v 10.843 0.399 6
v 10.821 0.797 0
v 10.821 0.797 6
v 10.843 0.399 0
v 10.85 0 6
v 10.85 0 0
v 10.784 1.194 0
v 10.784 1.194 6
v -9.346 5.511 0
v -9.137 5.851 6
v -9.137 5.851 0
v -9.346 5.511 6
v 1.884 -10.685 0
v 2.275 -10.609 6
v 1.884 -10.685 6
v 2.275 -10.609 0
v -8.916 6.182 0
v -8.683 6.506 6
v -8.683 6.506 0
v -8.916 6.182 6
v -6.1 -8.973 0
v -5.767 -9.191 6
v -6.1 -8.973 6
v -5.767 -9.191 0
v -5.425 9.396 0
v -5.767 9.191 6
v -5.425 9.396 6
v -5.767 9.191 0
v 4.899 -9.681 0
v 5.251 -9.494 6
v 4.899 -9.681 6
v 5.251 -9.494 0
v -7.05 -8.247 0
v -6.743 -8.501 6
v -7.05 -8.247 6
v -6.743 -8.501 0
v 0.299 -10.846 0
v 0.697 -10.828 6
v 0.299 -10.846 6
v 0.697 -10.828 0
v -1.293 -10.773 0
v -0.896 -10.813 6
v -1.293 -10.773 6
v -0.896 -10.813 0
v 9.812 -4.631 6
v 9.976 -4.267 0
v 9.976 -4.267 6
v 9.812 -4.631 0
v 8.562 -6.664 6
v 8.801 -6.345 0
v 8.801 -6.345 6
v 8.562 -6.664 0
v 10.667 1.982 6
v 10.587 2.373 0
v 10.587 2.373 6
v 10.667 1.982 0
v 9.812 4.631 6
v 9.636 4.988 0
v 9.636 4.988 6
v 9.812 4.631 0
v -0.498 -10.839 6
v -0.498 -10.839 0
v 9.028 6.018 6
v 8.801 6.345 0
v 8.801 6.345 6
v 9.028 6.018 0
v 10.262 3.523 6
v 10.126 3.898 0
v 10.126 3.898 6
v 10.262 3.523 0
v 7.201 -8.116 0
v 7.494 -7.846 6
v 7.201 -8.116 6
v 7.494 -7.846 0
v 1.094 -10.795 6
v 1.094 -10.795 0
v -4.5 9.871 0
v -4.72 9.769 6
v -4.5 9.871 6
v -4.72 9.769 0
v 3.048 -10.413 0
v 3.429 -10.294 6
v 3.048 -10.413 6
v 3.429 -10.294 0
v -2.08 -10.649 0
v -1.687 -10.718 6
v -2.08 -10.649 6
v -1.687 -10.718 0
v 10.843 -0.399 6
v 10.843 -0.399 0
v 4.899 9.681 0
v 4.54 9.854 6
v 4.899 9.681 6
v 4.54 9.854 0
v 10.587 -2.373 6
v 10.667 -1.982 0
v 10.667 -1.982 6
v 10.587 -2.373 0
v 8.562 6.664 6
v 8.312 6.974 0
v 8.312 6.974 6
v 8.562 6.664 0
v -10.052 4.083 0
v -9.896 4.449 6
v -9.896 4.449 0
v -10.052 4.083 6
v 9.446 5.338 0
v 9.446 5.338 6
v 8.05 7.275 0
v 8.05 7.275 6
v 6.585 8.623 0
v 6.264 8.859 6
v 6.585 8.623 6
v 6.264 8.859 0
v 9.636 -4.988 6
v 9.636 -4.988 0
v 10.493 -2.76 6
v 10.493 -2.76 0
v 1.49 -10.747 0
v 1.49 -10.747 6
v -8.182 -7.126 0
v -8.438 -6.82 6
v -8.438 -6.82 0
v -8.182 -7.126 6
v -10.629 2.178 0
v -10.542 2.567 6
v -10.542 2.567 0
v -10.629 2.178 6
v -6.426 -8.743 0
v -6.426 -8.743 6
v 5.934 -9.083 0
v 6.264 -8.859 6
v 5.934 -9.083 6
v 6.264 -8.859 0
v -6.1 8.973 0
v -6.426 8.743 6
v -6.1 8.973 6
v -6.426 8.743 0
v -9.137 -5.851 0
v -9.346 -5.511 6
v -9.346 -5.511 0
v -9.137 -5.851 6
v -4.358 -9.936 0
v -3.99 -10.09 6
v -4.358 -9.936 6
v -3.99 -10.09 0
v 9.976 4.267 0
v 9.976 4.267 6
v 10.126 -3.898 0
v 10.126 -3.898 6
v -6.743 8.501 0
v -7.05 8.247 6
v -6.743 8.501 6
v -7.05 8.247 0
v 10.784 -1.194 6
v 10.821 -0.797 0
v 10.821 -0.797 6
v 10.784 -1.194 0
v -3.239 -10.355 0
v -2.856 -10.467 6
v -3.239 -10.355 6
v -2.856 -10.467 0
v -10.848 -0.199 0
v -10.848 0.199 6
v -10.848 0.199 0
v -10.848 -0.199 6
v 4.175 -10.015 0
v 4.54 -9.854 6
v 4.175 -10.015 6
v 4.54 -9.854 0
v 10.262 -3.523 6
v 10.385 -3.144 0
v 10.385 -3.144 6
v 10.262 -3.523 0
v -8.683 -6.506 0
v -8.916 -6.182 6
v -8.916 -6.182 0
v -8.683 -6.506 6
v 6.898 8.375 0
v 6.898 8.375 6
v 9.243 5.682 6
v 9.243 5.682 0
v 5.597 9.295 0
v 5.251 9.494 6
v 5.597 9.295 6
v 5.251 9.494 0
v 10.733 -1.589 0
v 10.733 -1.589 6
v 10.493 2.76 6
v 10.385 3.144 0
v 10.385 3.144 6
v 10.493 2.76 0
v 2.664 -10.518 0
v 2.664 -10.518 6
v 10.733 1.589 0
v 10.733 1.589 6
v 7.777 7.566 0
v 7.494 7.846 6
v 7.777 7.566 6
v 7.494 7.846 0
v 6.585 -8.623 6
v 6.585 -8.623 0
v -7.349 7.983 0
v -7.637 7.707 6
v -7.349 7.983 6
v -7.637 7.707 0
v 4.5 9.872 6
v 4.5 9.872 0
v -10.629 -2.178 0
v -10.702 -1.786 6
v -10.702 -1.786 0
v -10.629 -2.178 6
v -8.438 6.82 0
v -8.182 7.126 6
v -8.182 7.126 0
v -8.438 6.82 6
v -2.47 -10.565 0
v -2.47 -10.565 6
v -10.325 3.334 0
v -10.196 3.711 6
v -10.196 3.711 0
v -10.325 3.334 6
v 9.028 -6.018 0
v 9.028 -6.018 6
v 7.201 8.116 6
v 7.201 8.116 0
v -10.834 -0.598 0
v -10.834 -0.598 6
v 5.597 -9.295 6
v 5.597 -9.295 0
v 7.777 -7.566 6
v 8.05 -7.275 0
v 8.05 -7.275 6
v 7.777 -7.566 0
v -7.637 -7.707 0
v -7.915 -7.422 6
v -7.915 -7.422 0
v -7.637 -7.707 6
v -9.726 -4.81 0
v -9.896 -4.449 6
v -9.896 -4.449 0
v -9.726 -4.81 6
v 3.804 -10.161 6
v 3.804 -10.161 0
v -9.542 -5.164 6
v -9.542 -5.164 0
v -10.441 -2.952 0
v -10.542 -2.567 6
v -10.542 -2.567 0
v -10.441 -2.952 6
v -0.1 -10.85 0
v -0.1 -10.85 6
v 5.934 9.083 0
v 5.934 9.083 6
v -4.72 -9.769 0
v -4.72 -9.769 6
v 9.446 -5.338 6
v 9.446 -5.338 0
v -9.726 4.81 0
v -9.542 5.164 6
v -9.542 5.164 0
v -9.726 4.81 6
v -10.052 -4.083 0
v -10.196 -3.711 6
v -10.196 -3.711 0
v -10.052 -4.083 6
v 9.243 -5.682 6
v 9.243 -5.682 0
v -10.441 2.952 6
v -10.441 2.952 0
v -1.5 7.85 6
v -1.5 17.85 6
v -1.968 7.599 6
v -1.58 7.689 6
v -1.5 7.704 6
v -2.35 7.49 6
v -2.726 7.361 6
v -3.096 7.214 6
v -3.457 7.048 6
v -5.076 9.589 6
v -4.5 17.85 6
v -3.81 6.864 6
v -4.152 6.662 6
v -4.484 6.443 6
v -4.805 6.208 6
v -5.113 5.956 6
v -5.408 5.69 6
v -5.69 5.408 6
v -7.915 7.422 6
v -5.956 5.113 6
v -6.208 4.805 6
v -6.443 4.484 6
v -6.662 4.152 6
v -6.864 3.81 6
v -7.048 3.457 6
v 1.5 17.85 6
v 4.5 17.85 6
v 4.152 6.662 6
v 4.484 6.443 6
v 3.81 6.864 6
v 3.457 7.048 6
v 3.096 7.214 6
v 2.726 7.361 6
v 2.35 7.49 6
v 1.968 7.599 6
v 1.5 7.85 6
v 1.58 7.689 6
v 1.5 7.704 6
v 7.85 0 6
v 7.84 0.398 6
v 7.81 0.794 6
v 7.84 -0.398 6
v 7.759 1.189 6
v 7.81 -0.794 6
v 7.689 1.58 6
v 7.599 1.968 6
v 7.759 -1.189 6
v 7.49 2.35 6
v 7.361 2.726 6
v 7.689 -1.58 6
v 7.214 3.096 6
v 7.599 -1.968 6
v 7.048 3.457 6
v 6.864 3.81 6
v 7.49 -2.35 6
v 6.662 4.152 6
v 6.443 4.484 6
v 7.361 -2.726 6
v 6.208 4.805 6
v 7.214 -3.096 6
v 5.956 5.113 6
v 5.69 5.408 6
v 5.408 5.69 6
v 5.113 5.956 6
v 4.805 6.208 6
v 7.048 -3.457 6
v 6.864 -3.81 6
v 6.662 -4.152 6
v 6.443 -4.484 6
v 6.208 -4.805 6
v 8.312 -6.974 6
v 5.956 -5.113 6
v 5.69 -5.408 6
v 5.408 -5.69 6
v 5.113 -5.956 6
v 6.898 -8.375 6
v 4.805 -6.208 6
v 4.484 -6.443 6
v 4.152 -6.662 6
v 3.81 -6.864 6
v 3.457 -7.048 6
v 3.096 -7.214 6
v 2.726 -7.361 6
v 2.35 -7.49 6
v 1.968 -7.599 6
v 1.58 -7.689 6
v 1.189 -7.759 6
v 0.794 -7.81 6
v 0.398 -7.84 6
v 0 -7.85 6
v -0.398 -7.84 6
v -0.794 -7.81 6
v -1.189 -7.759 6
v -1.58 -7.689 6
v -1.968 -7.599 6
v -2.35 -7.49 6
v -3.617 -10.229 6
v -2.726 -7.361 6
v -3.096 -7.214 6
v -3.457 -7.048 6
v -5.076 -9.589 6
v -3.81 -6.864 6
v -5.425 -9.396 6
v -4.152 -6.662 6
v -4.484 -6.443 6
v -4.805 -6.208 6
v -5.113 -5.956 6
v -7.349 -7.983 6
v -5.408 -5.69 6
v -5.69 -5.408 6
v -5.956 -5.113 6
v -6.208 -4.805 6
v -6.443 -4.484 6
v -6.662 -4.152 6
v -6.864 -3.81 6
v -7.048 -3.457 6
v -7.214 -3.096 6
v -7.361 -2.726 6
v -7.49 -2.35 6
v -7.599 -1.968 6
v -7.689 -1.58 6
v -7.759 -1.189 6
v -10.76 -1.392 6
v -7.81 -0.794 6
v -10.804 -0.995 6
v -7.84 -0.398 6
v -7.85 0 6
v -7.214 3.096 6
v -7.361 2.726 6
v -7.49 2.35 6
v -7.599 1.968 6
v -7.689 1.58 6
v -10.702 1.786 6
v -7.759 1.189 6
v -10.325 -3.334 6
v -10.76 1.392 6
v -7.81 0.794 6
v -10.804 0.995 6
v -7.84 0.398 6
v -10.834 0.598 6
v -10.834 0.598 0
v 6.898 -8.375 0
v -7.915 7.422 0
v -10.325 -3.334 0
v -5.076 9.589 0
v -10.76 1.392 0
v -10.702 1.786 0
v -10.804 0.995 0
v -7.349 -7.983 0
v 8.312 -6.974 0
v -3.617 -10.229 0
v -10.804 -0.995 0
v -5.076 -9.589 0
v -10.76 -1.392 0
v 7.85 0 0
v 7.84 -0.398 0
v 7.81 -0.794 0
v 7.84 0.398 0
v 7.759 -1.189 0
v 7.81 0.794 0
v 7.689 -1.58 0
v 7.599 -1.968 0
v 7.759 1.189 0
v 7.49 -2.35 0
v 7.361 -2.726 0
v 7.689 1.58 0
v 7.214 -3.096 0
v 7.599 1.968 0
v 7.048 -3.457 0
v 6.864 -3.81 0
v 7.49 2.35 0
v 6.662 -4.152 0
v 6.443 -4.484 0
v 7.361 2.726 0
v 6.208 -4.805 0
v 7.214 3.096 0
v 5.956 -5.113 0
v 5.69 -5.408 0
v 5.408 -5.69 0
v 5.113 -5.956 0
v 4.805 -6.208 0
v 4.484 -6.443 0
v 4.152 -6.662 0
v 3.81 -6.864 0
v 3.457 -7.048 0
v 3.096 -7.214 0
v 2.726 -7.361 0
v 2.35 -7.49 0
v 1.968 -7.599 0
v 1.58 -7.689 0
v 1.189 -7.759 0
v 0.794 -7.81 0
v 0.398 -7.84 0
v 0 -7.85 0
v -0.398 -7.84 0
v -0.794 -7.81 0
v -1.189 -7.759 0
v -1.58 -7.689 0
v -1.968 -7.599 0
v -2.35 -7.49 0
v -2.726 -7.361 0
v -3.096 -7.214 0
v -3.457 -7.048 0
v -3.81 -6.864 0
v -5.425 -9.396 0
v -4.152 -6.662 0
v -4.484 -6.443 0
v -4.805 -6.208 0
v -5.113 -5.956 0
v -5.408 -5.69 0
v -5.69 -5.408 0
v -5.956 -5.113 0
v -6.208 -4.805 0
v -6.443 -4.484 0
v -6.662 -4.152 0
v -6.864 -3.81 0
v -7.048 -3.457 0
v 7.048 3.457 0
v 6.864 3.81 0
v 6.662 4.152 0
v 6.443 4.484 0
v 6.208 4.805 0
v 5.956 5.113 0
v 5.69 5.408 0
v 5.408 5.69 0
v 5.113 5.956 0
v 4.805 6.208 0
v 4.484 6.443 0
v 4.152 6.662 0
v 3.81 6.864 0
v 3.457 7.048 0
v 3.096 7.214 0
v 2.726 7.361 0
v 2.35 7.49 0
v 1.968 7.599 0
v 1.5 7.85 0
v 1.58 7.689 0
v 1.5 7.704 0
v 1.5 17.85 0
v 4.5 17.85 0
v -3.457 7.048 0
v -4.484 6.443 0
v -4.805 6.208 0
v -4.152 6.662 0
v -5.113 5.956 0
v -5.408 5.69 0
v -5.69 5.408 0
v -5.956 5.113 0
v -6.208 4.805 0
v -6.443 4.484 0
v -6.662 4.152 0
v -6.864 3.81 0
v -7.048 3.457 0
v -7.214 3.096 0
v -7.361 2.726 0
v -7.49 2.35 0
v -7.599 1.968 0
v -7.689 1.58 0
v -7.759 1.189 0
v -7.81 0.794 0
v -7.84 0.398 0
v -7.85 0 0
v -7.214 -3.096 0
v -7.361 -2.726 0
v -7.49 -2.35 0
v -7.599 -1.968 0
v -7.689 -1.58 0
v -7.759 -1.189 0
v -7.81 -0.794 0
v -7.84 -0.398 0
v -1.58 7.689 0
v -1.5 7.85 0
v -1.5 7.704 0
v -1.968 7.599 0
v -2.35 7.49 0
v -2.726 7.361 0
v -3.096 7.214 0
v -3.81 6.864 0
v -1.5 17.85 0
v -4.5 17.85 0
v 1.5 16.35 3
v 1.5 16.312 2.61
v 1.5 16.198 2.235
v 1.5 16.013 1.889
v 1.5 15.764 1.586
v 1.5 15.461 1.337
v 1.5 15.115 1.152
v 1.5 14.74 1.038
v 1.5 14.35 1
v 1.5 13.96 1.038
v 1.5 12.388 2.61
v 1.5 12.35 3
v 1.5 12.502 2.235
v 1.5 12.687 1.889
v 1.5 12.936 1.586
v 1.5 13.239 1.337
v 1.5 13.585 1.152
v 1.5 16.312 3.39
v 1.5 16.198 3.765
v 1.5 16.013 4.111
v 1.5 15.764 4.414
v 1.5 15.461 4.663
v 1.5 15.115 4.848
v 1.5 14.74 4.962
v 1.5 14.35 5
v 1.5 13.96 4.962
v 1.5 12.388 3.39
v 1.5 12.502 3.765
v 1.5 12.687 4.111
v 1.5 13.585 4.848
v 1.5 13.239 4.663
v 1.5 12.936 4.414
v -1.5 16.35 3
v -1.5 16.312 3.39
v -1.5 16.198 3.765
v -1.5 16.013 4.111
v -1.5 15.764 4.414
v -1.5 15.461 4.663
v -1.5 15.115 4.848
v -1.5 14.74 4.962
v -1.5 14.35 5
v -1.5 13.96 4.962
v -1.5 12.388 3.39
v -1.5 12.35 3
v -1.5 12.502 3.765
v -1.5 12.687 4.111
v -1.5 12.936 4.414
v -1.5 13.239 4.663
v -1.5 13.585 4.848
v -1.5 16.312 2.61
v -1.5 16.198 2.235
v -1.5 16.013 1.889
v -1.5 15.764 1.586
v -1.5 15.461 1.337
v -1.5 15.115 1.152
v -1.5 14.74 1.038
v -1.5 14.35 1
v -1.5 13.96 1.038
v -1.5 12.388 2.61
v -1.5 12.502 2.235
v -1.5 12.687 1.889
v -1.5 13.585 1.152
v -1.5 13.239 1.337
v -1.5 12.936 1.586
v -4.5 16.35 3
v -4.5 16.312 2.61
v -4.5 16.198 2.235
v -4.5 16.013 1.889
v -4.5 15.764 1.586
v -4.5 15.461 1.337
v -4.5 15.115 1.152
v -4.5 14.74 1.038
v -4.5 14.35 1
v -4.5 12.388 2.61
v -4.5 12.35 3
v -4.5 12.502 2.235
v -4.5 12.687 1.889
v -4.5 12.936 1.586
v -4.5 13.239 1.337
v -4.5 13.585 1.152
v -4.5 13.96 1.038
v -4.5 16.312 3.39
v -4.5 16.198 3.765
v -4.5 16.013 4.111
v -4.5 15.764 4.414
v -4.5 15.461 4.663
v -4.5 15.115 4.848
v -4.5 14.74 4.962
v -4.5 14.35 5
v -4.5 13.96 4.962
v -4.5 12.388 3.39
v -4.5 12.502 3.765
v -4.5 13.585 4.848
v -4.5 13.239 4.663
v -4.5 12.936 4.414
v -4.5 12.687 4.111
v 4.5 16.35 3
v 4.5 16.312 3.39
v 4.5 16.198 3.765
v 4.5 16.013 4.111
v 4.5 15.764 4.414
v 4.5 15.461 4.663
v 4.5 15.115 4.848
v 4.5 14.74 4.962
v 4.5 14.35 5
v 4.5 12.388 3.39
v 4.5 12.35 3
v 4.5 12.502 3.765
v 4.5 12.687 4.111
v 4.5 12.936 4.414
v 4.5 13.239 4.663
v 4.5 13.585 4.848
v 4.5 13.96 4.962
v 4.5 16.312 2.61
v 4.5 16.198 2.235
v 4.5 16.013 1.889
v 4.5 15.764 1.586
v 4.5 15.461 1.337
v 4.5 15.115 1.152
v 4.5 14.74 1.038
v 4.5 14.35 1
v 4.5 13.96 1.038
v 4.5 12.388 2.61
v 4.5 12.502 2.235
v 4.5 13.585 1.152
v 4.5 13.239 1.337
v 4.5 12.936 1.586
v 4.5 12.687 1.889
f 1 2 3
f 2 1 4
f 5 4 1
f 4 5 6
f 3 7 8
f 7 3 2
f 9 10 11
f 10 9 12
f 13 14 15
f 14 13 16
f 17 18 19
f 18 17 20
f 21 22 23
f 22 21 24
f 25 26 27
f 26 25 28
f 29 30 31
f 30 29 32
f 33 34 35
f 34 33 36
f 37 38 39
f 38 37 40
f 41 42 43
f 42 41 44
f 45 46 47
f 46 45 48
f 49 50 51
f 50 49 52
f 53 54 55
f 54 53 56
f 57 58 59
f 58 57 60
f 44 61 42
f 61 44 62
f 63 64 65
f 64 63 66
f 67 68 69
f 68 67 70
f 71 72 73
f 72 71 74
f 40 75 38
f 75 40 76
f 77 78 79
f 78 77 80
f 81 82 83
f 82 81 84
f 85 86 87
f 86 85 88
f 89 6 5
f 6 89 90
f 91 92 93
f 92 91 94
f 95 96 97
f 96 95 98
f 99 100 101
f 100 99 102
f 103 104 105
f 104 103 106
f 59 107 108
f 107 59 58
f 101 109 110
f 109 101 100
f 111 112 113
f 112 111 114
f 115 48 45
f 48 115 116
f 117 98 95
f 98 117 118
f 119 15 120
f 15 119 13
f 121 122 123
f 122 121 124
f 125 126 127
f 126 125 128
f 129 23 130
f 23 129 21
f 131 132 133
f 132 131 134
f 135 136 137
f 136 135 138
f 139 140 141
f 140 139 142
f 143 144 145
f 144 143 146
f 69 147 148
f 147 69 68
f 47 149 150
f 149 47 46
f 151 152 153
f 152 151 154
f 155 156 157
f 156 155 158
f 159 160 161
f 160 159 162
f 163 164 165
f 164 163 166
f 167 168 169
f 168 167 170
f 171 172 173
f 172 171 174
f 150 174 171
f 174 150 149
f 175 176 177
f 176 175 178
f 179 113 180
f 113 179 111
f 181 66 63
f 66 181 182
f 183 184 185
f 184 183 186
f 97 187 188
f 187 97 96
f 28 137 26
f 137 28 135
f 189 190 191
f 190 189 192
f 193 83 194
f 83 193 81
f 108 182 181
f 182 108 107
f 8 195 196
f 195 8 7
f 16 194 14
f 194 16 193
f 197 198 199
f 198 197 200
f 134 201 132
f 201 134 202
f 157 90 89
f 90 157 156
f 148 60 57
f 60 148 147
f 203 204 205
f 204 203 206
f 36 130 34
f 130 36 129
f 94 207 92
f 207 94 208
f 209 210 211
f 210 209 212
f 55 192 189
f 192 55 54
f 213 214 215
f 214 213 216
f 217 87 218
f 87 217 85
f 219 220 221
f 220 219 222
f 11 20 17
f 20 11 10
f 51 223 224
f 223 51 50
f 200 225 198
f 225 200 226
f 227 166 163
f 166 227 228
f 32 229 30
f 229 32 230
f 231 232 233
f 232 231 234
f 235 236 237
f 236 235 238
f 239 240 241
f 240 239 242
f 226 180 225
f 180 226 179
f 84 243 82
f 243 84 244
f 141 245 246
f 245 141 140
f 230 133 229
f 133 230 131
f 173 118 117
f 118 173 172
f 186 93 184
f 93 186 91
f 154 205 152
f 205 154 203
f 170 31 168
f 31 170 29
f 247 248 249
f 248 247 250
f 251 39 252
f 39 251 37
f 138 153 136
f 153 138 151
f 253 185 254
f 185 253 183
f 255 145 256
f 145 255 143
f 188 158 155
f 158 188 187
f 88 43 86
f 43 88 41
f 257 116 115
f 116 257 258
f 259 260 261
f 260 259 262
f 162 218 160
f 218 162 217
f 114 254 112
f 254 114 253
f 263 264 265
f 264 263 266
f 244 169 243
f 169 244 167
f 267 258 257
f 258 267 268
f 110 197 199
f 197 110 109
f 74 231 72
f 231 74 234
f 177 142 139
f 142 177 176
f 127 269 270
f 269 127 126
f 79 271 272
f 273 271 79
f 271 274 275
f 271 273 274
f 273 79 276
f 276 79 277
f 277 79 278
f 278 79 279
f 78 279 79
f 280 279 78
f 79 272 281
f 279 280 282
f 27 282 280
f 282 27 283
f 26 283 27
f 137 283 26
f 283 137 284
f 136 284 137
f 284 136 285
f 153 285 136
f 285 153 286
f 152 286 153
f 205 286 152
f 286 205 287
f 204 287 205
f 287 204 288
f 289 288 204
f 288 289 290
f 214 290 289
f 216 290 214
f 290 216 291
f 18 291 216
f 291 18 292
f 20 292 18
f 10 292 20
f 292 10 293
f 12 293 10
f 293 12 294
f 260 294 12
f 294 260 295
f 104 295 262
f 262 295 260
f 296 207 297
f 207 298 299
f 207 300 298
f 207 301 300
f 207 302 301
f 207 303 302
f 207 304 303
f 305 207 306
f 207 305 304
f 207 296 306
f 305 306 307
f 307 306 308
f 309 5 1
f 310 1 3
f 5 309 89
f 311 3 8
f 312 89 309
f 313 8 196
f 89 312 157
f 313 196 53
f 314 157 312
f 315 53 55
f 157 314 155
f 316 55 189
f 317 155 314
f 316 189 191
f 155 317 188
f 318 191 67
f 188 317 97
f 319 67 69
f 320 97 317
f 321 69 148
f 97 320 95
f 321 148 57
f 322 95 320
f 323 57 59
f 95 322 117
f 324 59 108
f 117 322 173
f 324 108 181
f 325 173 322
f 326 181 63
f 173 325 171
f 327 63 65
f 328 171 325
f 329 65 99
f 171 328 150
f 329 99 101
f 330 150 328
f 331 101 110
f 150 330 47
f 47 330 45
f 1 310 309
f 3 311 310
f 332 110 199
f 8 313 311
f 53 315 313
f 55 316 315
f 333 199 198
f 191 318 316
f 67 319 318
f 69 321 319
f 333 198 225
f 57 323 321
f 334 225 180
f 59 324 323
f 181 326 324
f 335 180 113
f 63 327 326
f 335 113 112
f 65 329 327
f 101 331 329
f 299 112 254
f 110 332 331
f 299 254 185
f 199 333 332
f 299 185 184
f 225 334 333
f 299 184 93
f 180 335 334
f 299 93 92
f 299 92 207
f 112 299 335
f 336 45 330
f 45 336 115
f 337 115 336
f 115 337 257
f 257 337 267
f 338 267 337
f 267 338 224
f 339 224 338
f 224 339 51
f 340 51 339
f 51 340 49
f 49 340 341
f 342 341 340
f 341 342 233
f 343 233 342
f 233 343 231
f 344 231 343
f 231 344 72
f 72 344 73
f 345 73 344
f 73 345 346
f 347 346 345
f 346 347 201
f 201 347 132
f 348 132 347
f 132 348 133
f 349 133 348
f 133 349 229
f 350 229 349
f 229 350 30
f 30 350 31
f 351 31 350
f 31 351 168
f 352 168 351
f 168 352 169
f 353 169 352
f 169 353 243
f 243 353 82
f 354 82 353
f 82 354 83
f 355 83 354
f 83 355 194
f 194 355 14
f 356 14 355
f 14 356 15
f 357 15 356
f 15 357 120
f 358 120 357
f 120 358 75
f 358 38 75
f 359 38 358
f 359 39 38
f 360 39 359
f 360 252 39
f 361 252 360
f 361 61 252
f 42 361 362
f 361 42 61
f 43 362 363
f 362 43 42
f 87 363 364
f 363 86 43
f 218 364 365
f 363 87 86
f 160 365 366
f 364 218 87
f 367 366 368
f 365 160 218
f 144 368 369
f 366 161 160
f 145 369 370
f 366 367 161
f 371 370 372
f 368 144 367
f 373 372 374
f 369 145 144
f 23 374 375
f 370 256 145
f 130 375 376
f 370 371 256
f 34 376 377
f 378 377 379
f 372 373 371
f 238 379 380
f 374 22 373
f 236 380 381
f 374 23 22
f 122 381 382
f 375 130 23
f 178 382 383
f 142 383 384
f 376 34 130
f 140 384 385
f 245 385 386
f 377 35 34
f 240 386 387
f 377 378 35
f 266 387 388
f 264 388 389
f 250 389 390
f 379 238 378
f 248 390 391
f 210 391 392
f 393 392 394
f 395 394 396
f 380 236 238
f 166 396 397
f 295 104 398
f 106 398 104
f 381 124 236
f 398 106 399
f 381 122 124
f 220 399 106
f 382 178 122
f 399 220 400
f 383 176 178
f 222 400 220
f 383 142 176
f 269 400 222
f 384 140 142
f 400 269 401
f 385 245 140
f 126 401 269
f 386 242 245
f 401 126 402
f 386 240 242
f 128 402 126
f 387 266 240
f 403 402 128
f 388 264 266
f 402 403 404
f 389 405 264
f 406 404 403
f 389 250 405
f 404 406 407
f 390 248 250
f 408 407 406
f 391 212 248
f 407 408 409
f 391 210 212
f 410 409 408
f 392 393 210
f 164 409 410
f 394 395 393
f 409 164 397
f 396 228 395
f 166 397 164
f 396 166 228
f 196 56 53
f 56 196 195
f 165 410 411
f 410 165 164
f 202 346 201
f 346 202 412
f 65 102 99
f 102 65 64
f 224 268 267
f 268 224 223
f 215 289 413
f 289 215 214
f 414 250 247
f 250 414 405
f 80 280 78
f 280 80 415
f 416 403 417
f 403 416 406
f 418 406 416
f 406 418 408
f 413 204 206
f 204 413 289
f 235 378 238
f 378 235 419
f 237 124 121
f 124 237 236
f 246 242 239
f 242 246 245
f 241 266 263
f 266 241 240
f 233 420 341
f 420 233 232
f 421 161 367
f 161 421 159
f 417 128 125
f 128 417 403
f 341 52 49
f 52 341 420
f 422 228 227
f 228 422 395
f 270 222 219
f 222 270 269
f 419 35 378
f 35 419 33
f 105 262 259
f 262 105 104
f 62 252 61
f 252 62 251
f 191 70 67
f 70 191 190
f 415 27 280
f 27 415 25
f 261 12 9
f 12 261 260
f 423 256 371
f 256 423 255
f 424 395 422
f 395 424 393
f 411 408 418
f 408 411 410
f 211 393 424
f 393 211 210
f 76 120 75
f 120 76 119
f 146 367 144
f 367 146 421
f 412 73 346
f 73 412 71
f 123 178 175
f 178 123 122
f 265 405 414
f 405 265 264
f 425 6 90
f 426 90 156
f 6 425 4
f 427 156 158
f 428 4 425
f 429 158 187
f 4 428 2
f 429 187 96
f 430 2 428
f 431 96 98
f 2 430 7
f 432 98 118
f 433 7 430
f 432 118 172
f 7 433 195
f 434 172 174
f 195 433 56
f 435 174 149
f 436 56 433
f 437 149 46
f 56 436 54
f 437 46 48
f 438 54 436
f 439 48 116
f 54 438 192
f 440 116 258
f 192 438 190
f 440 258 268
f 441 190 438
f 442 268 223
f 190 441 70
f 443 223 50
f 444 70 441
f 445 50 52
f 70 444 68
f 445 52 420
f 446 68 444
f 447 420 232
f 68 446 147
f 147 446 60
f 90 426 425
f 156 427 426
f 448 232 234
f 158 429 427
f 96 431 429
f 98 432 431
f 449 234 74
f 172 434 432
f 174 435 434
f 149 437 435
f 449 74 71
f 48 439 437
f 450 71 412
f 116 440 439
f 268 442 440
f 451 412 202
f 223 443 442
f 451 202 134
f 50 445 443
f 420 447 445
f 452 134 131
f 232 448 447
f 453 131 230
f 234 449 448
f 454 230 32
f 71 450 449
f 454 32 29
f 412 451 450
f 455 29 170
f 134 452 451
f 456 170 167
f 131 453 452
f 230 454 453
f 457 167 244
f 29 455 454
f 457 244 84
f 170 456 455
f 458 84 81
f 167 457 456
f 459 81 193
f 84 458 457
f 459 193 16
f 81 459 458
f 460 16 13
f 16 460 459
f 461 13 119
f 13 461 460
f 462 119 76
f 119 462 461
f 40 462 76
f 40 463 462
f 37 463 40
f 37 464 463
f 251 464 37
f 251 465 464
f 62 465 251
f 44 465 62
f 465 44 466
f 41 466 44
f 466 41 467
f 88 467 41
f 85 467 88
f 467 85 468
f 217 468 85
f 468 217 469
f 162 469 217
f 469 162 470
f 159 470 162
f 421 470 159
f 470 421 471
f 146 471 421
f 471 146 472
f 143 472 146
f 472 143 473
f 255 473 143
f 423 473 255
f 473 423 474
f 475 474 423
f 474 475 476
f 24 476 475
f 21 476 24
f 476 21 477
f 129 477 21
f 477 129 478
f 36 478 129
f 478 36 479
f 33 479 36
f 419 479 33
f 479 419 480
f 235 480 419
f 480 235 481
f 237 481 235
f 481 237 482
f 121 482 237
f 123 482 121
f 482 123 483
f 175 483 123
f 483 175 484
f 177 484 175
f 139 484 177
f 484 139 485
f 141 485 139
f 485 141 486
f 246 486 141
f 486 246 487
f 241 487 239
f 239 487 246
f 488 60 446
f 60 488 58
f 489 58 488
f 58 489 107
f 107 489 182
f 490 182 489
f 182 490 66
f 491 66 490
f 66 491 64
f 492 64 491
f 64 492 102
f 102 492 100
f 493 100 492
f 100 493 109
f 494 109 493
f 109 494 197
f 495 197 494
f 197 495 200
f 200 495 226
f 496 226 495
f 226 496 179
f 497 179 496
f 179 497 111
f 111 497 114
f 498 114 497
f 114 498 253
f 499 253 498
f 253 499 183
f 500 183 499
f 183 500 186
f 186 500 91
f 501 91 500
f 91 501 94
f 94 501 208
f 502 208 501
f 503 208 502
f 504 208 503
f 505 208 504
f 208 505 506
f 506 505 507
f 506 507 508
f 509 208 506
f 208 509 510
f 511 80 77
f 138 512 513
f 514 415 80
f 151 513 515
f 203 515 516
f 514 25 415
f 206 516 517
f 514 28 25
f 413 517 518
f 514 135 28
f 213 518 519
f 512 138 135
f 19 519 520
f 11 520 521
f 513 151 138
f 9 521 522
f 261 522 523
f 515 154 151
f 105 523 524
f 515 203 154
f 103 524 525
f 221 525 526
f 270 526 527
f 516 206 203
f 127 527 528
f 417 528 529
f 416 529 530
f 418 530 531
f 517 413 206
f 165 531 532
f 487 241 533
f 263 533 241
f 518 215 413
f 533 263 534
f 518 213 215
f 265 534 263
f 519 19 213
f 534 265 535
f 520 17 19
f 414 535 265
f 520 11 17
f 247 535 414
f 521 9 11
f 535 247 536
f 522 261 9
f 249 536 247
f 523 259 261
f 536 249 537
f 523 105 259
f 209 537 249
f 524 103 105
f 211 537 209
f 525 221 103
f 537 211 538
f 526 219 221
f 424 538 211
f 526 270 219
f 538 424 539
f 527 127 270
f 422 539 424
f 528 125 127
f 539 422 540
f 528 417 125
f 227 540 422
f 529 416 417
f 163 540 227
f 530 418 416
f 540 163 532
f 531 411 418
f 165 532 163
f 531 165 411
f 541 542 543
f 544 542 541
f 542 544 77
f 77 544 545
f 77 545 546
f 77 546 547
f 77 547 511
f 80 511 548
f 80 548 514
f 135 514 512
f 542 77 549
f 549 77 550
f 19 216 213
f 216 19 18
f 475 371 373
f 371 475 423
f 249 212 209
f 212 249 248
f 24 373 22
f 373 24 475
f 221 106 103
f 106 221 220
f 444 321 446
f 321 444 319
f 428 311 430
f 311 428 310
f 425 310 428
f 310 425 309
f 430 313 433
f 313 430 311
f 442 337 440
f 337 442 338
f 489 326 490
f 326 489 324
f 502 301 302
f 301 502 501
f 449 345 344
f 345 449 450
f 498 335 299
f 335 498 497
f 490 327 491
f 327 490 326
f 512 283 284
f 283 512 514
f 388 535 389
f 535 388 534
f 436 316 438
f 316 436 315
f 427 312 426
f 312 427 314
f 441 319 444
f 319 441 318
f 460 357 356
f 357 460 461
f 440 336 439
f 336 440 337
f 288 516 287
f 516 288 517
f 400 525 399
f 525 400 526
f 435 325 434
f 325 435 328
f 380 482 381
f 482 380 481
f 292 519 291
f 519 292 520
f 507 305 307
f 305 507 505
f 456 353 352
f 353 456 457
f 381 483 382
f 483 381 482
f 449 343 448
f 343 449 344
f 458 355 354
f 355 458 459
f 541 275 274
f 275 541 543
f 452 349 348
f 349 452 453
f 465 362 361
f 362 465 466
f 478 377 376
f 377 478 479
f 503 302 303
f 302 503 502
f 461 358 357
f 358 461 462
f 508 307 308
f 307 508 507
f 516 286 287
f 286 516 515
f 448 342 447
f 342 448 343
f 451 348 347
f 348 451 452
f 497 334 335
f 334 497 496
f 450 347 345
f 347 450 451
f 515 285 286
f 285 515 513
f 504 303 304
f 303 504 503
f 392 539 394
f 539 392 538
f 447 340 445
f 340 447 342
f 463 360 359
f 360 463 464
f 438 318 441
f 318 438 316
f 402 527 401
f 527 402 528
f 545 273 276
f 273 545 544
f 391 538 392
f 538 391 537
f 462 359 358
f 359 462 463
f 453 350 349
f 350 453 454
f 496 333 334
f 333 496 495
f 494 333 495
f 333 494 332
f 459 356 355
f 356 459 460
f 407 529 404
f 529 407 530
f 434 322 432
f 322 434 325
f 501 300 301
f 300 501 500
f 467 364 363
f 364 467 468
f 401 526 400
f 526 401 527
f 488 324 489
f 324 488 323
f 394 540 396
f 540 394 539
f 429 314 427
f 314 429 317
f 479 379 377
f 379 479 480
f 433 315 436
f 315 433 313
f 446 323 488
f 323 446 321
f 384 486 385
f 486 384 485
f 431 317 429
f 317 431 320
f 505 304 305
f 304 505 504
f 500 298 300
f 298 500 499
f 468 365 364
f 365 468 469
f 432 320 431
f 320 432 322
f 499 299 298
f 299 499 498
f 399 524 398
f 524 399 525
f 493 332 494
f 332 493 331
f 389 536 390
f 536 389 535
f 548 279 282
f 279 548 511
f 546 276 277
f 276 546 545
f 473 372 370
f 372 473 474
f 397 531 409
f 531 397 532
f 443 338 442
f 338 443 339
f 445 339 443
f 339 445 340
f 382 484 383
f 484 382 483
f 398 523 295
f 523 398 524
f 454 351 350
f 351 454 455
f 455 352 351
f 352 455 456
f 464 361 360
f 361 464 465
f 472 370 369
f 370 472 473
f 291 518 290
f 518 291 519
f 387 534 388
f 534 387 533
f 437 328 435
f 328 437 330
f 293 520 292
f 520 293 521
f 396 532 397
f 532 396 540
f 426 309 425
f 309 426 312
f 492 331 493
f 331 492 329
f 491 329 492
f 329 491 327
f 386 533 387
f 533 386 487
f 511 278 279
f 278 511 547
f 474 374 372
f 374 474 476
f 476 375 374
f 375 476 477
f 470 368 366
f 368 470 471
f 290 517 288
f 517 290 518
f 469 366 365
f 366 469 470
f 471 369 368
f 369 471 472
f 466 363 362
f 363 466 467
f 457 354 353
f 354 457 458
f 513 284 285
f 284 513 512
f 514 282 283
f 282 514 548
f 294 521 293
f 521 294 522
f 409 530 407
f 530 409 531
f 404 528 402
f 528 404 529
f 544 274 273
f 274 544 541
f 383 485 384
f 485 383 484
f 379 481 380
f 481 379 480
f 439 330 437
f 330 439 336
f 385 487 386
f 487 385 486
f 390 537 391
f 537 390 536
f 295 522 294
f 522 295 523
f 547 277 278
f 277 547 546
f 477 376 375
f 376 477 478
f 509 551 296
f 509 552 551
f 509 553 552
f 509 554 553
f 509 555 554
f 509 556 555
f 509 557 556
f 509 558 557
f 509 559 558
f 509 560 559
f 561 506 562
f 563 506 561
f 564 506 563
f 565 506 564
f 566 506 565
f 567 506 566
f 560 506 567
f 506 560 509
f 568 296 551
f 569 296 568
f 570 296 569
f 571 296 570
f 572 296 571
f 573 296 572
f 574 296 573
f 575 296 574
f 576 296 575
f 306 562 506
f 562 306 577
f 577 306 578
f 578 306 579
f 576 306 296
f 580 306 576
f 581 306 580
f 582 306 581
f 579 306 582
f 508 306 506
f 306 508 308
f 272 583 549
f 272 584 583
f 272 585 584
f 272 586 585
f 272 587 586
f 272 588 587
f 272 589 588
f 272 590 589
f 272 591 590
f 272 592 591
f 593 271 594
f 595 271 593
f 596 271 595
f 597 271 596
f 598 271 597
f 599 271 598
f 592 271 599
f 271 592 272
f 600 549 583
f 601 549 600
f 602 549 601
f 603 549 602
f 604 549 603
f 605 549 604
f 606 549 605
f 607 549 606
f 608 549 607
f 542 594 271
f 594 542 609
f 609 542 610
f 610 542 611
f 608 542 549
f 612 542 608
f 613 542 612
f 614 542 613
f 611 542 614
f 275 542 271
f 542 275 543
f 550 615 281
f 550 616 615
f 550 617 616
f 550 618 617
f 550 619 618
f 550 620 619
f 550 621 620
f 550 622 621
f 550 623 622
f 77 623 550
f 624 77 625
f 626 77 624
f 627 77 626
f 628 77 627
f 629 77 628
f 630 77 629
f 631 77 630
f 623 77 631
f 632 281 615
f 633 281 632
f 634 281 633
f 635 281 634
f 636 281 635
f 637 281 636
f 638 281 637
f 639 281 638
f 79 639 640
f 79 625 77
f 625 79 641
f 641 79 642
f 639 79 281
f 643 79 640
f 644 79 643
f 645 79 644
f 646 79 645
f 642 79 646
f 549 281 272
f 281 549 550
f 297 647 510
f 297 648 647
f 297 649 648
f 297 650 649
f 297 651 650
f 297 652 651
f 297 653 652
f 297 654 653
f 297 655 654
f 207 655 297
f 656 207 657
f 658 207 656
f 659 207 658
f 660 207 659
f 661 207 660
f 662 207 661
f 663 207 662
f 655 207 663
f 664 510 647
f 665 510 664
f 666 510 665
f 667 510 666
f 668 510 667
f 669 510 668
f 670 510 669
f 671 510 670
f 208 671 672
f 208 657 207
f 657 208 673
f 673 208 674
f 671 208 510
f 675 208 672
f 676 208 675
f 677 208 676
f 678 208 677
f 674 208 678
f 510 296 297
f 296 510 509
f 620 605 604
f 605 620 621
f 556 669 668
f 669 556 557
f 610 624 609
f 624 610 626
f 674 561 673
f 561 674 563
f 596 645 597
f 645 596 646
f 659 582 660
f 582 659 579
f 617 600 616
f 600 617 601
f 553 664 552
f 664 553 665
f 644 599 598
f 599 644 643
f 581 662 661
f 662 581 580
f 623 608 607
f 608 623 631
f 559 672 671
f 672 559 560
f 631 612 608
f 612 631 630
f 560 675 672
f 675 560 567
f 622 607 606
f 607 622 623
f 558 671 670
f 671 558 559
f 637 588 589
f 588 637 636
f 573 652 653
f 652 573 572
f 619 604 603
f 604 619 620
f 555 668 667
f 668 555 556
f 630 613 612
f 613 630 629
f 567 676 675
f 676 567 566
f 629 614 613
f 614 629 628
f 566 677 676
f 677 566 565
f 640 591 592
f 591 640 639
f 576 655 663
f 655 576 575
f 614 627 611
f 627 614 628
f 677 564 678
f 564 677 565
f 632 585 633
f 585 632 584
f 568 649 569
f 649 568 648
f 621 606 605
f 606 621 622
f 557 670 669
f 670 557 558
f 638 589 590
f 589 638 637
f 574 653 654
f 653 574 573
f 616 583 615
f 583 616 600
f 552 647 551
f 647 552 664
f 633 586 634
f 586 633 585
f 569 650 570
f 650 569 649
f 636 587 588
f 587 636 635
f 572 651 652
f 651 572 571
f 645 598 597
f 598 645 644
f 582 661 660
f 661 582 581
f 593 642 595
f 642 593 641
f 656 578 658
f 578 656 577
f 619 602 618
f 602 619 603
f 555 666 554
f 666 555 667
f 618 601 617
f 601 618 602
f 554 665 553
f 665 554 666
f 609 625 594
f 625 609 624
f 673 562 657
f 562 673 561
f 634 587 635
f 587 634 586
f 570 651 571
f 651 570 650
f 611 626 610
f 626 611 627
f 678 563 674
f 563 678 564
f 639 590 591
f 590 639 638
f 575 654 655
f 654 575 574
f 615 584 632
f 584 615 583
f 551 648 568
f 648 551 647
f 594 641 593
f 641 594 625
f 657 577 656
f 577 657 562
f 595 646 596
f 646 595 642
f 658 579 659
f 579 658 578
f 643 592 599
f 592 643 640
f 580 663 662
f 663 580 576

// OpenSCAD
//Measurements.
radius = 15.7 / 2; //Inner radius.
height = 6;
bolt_radius = 4 / 2; //M4.

//Settings.
thickness = 3;
opening_width = 3;
$fs = 0.4;
$fa = 1;

//Implementation.
difference() {
	cylinder(r=radius + thickness, h=height); //Body of the ring.
	translate([0, 0, -1]) {
		cylinder(r=radius, h=height + 2); //Hole in the ring.
	}
	translate([-opening_width / 2, 0, -1]) {
		cube([opening_width, radius + thickness + 1, height + 2]); //Opening in the ring.
	}
}
difference() {
	union() {
		translate([-opening_width / 2 - thickness, radius, 0]) {
			cube([thickness, thickness * 2 + bolt_radius * 2, height]);
		}
		translate([opening_width / 2, radius, 0]) {
			cube([thickness, thickness * 2 + bolt_radius * 2, height]);
		}
	}
	translate([-opening_width / 2 - thickness - 1, radius + thickness * 1.5 + bolt_radius, height / 2]) {
		rotate([0, 90, 0]) {
			cylinder(r=bolt_radius, h=thickness * 2 + opening_width + 2);
		}
	}
}
